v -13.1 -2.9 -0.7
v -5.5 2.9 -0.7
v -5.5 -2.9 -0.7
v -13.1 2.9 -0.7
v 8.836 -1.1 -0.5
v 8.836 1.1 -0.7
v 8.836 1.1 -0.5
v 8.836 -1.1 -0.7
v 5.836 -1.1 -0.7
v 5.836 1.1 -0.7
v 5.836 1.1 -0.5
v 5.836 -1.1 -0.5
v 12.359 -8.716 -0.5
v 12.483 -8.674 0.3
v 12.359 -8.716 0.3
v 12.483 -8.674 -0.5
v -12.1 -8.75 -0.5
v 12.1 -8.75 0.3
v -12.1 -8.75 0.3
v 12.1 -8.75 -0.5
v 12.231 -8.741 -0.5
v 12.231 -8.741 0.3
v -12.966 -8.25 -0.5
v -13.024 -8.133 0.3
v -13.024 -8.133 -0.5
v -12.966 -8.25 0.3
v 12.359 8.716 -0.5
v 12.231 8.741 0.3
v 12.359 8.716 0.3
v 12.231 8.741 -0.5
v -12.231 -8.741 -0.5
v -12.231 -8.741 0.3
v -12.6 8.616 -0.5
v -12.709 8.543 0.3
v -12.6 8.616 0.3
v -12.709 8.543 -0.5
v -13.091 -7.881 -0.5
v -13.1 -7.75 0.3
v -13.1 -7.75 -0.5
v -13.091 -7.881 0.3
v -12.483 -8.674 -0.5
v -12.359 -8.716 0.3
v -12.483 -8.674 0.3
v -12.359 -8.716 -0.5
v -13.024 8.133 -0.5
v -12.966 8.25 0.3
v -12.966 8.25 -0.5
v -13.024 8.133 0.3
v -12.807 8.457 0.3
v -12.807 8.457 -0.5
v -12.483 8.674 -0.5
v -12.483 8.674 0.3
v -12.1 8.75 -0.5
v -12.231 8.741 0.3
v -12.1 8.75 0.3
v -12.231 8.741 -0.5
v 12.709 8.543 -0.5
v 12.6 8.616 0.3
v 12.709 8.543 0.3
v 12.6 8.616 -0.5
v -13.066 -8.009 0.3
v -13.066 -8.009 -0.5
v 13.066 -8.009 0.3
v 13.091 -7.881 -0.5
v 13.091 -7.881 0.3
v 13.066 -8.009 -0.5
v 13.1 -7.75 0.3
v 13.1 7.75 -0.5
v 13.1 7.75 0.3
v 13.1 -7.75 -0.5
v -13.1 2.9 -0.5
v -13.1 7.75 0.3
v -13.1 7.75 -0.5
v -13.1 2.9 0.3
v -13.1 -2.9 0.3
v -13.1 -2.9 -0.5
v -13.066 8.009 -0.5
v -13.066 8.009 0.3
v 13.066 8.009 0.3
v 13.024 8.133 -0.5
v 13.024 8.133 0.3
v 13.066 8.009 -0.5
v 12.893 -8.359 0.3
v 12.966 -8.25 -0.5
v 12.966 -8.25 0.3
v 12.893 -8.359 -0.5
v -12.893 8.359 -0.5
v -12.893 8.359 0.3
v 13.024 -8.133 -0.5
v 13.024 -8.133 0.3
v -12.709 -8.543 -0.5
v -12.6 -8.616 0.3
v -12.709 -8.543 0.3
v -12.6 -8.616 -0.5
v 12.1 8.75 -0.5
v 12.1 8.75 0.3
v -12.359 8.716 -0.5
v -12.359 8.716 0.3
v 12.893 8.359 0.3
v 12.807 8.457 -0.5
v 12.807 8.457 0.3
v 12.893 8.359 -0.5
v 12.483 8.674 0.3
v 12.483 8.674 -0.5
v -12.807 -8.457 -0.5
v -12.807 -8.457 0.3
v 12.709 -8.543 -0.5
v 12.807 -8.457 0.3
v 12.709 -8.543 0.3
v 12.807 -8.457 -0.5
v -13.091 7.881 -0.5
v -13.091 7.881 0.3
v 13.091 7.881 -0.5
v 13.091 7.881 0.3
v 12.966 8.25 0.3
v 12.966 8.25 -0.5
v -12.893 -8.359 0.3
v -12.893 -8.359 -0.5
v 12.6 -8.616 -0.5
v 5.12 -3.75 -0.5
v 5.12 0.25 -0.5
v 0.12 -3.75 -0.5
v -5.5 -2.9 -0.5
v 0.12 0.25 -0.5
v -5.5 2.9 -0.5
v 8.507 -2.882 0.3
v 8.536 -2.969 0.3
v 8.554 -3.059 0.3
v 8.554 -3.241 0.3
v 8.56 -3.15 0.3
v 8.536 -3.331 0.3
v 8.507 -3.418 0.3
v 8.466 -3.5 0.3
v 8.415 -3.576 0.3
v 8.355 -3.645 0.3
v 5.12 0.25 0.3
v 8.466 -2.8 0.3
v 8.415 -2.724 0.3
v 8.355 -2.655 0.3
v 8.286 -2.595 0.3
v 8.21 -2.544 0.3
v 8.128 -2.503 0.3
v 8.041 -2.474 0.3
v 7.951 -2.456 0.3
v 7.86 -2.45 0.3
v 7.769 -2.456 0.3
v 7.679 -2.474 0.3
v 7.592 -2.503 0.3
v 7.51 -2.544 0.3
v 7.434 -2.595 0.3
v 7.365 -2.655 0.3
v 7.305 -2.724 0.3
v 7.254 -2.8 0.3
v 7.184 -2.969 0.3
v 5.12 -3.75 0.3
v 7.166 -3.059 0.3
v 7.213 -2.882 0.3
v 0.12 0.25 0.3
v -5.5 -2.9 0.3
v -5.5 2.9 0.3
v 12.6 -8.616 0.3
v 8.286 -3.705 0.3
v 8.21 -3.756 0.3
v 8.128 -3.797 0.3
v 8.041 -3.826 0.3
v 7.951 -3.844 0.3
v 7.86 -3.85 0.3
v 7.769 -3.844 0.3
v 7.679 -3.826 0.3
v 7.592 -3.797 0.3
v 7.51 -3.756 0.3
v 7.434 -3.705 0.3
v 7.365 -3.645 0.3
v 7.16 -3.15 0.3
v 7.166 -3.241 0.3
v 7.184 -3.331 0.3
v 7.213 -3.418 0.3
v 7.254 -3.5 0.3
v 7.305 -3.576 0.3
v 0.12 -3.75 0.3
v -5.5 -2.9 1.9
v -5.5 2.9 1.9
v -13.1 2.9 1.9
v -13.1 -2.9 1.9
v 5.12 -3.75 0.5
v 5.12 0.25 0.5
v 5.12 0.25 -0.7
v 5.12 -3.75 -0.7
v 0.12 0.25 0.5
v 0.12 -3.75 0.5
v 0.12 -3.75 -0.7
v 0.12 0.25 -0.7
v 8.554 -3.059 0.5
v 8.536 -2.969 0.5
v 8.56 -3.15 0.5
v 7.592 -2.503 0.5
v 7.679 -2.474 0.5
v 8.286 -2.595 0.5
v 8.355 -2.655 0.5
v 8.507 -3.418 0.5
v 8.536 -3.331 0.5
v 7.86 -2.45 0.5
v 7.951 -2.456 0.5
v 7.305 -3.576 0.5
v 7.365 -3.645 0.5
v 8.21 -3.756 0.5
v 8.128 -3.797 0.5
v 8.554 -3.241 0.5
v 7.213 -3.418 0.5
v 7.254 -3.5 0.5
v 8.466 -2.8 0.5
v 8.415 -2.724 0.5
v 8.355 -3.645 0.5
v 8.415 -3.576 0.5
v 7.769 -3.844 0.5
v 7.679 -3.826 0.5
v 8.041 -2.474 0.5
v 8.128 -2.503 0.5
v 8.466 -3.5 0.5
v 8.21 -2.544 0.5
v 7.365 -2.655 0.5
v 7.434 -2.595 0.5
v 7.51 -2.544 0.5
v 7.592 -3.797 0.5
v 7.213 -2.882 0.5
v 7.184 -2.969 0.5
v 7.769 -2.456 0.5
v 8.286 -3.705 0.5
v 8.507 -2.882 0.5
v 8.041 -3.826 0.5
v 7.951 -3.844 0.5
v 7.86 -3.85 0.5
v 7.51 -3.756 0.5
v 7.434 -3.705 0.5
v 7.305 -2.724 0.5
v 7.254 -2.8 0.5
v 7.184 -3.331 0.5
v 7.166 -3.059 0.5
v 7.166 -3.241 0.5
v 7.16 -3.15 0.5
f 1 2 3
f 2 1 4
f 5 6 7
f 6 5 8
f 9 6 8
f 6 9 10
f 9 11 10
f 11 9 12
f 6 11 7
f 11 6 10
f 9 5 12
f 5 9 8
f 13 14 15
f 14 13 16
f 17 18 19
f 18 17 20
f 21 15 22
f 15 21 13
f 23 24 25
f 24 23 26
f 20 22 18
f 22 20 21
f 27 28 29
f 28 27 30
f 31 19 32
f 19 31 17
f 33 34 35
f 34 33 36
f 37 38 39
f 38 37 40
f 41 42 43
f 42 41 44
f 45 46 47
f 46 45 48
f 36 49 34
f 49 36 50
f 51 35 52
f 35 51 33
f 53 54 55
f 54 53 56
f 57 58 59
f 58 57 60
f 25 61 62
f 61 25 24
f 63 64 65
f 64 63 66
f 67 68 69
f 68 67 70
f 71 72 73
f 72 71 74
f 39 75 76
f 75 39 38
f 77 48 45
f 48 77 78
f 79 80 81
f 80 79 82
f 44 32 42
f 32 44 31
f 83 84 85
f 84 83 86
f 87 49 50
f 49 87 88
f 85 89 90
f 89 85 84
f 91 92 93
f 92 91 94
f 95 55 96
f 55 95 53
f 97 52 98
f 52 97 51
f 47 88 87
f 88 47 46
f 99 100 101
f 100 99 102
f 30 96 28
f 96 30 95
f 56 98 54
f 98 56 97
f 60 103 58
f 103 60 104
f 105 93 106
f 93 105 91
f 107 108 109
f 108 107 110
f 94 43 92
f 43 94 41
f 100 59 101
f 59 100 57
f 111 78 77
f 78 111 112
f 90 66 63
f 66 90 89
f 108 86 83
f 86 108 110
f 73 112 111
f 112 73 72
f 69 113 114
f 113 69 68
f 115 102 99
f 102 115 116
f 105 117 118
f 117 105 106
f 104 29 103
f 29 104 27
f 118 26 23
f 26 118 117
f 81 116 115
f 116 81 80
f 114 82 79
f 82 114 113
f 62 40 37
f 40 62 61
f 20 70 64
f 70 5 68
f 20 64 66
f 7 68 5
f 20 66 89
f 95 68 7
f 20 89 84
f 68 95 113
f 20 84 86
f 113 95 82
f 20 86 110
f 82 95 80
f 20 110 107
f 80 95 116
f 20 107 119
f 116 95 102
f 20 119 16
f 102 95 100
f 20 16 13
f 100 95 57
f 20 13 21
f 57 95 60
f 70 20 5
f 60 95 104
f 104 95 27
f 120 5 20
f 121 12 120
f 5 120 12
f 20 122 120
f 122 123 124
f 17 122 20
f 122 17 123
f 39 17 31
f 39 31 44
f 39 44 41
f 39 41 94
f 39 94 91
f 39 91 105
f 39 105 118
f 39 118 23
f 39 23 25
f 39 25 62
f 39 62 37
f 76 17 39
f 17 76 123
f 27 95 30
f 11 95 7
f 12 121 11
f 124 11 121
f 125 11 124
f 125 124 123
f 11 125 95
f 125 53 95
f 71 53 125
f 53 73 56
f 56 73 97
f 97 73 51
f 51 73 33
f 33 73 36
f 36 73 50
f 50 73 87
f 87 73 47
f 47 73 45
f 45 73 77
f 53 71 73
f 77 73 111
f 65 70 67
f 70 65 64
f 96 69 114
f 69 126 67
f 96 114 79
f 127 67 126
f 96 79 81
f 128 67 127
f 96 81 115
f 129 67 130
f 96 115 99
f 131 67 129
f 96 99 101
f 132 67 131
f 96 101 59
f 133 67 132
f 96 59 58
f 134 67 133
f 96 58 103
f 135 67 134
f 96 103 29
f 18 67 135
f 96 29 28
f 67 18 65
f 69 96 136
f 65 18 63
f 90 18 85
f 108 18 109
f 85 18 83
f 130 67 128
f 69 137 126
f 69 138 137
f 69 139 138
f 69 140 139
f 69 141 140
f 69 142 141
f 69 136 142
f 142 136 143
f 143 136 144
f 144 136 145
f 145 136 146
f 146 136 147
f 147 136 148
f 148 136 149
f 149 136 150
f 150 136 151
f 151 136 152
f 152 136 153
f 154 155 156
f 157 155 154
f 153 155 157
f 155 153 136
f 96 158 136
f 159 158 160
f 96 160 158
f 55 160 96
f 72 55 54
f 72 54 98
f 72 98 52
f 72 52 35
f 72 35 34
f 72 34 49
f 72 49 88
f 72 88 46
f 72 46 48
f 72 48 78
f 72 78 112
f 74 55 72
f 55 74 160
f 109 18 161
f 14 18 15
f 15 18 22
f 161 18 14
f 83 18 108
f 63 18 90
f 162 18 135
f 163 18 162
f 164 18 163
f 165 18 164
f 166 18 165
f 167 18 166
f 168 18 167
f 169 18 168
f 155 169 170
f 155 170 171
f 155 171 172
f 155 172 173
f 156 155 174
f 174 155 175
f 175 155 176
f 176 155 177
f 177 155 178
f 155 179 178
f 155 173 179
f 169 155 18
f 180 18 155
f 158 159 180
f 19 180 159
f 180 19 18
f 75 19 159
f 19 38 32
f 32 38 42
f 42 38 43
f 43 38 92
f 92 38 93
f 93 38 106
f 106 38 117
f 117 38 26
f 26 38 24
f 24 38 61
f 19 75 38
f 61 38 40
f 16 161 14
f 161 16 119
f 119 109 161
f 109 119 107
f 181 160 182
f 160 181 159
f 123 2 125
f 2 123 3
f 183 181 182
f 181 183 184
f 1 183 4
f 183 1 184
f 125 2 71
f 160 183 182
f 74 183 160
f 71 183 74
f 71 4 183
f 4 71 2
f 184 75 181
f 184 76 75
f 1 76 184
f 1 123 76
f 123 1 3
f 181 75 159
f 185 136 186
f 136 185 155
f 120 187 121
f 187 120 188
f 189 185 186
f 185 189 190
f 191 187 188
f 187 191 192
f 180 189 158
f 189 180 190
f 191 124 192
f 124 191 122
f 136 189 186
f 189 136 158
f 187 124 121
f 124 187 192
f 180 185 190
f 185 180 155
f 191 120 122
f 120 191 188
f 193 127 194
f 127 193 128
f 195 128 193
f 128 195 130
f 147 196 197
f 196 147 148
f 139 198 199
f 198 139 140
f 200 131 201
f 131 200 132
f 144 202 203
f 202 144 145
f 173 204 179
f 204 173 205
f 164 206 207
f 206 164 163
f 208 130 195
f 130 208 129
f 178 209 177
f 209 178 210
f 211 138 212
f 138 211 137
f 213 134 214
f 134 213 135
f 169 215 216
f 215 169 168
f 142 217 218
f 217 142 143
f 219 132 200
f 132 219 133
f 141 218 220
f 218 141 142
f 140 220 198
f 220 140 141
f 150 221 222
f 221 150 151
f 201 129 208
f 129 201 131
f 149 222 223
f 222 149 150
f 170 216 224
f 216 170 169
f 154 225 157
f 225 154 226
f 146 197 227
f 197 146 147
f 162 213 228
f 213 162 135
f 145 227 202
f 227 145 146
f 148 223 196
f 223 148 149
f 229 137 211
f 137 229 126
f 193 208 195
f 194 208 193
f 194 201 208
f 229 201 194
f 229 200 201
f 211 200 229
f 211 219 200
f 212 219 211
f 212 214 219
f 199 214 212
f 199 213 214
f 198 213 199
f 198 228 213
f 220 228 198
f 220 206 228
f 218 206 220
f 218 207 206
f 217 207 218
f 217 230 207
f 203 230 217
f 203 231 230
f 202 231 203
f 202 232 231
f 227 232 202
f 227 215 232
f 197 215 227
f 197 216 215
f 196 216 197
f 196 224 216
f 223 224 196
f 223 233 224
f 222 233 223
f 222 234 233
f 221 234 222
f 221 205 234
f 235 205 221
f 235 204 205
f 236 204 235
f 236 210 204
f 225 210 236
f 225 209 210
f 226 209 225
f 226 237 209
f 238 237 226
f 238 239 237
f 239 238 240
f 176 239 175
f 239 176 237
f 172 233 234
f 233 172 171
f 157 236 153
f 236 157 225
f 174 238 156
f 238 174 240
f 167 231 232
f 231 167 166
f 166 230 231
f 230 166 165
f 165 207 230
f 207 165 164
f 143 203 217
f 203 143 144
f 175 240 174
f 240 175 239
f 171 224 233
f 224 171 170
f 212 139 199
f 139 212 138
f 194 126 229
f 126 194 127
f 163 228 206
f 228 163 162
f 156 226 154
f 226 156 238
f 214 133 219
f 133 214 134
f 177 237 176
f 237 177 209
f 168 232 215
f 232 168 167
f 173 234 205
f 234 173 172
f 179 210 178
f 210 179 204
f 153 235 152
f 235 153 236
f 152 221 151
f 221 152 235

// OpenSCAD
$fn = 48;

// Target overall size (module footprint)
length = 26.2;
width  = 17.5;
thickness = 1.0;

// Overlap to guarantee a single connected solid (1–2mm as required)
overlap = 1.0;

// Rounded rectangle prism
module rounded_plate(l, w, h, r=0, center=true) {
    r2 = min(r, min(l, w)/2);
    if (r2 <= 0) {
        cube([l, w, h], center=center);
    } else {
        translate(center ? [0,0,0] : [l/2, w/2, h/2])
            linear_extrude(height=h, center=true)
                offset(r=r2)
                    square([l-2*r2, w-2*r2], center=true);
    }
}

// Battery charger module (single connected solid)
module charger_module() {
    // PCB thickness (kept within overall thickness)
    pcb_t = 0.8;

    // Component heights
    usb_h = 2.6;
    pad_h = 0.6;
    ic_h  = 1.2;
    led_h = 0.8;

    // Feature sizes (within footprint)
    usb_w = 7.6;
    usb_d = 5.8;

    pad_w = 3.0;
    pad_d = 2.2;

    ic_l = 5.0;
    ic_w = 4.0;

    led_r = 0.7;

    // --- Z references (PCB centered so bottom is at -thickness/2) ---
    pcb_z      = -thickness/2 + pcb_t/2;
    pcb_top_z  = -thickness/2 + pcb_t;
    pcb_bot_z  = -thickness/2;

    // Place each TOP component so its bottom penetrates into PCB by `overlap`
    usb_z = pcb_top_z - overlap + usb_h/2;
    pad_z = pcb_top_z - overlap + pad_h/2;
    ic_z  = pcb_top_z - overlap + ic_h/2;

    // Place BOTTOM feature (red) so its top penetrates into PCB by `overlap`
    led_z = pcb_bot_z + overlap - led_h/2;

    // --- XY positions (recalculated to ensure seated/flush and within footprint) ---
    // USB connector: seated at the LEFT edge (as in side view), centered in Y
    usb_x = -length/2 + usb_w/2;
    usb_y = 0;

    // Two solder pads: near left/right, centered in Y (as in top view)
    pad_y = 0;
    pad_x_off = length*0.28;

    // Charger IC: slightly right of center, slightly down (matches typical layout)
    ic_x = length*0.10;
    ic_y = -width*0.10;

    // Small red feature: on bottom side, near lower-right quadrant
    led_x = length*0.30;
    led_y = -width*0.18;

    union() {
        // PCB
        color([0.0, 0.45, 0.2])
            translate([0, 0, pcb_z])
                rounded_plate(length, width, pcb_t, r=1.0, center=true);

        // USB connector block (fused into PCB via overlap)
        color([0.75, 0.75, 0.75])
            translate([usb_x, usb_y, usb_z])
                cube([usb_w, usb_d, usb_h], center=true);

        // Two solder pads (fused into PCB via overlap)
        color([0.85, 0.7, 0.2])
            for (sx = [-pad_x_off, pad_x_off]) {
                translate([sx, pad_y, pad_z])
                    cube([pad_w, pad_d, pad_h], center=true);
            }

        // Charger IC (fused into PCB via overlap)
        color([0.15, 0.15, 0.15])
            translate([ic_x, ic_y, ic_z])
                cube([ic_l, ic_w, ic_h], center=true);

        // Small red feature on the BOTTOM (fused into PCB via overlap)
        color([0.9, 0.1, 0.1])
            translate([led_x, led_y, led_z])
                cylinder(r=led_r, h=led_h, center=true);
    }
}

charger_module();
